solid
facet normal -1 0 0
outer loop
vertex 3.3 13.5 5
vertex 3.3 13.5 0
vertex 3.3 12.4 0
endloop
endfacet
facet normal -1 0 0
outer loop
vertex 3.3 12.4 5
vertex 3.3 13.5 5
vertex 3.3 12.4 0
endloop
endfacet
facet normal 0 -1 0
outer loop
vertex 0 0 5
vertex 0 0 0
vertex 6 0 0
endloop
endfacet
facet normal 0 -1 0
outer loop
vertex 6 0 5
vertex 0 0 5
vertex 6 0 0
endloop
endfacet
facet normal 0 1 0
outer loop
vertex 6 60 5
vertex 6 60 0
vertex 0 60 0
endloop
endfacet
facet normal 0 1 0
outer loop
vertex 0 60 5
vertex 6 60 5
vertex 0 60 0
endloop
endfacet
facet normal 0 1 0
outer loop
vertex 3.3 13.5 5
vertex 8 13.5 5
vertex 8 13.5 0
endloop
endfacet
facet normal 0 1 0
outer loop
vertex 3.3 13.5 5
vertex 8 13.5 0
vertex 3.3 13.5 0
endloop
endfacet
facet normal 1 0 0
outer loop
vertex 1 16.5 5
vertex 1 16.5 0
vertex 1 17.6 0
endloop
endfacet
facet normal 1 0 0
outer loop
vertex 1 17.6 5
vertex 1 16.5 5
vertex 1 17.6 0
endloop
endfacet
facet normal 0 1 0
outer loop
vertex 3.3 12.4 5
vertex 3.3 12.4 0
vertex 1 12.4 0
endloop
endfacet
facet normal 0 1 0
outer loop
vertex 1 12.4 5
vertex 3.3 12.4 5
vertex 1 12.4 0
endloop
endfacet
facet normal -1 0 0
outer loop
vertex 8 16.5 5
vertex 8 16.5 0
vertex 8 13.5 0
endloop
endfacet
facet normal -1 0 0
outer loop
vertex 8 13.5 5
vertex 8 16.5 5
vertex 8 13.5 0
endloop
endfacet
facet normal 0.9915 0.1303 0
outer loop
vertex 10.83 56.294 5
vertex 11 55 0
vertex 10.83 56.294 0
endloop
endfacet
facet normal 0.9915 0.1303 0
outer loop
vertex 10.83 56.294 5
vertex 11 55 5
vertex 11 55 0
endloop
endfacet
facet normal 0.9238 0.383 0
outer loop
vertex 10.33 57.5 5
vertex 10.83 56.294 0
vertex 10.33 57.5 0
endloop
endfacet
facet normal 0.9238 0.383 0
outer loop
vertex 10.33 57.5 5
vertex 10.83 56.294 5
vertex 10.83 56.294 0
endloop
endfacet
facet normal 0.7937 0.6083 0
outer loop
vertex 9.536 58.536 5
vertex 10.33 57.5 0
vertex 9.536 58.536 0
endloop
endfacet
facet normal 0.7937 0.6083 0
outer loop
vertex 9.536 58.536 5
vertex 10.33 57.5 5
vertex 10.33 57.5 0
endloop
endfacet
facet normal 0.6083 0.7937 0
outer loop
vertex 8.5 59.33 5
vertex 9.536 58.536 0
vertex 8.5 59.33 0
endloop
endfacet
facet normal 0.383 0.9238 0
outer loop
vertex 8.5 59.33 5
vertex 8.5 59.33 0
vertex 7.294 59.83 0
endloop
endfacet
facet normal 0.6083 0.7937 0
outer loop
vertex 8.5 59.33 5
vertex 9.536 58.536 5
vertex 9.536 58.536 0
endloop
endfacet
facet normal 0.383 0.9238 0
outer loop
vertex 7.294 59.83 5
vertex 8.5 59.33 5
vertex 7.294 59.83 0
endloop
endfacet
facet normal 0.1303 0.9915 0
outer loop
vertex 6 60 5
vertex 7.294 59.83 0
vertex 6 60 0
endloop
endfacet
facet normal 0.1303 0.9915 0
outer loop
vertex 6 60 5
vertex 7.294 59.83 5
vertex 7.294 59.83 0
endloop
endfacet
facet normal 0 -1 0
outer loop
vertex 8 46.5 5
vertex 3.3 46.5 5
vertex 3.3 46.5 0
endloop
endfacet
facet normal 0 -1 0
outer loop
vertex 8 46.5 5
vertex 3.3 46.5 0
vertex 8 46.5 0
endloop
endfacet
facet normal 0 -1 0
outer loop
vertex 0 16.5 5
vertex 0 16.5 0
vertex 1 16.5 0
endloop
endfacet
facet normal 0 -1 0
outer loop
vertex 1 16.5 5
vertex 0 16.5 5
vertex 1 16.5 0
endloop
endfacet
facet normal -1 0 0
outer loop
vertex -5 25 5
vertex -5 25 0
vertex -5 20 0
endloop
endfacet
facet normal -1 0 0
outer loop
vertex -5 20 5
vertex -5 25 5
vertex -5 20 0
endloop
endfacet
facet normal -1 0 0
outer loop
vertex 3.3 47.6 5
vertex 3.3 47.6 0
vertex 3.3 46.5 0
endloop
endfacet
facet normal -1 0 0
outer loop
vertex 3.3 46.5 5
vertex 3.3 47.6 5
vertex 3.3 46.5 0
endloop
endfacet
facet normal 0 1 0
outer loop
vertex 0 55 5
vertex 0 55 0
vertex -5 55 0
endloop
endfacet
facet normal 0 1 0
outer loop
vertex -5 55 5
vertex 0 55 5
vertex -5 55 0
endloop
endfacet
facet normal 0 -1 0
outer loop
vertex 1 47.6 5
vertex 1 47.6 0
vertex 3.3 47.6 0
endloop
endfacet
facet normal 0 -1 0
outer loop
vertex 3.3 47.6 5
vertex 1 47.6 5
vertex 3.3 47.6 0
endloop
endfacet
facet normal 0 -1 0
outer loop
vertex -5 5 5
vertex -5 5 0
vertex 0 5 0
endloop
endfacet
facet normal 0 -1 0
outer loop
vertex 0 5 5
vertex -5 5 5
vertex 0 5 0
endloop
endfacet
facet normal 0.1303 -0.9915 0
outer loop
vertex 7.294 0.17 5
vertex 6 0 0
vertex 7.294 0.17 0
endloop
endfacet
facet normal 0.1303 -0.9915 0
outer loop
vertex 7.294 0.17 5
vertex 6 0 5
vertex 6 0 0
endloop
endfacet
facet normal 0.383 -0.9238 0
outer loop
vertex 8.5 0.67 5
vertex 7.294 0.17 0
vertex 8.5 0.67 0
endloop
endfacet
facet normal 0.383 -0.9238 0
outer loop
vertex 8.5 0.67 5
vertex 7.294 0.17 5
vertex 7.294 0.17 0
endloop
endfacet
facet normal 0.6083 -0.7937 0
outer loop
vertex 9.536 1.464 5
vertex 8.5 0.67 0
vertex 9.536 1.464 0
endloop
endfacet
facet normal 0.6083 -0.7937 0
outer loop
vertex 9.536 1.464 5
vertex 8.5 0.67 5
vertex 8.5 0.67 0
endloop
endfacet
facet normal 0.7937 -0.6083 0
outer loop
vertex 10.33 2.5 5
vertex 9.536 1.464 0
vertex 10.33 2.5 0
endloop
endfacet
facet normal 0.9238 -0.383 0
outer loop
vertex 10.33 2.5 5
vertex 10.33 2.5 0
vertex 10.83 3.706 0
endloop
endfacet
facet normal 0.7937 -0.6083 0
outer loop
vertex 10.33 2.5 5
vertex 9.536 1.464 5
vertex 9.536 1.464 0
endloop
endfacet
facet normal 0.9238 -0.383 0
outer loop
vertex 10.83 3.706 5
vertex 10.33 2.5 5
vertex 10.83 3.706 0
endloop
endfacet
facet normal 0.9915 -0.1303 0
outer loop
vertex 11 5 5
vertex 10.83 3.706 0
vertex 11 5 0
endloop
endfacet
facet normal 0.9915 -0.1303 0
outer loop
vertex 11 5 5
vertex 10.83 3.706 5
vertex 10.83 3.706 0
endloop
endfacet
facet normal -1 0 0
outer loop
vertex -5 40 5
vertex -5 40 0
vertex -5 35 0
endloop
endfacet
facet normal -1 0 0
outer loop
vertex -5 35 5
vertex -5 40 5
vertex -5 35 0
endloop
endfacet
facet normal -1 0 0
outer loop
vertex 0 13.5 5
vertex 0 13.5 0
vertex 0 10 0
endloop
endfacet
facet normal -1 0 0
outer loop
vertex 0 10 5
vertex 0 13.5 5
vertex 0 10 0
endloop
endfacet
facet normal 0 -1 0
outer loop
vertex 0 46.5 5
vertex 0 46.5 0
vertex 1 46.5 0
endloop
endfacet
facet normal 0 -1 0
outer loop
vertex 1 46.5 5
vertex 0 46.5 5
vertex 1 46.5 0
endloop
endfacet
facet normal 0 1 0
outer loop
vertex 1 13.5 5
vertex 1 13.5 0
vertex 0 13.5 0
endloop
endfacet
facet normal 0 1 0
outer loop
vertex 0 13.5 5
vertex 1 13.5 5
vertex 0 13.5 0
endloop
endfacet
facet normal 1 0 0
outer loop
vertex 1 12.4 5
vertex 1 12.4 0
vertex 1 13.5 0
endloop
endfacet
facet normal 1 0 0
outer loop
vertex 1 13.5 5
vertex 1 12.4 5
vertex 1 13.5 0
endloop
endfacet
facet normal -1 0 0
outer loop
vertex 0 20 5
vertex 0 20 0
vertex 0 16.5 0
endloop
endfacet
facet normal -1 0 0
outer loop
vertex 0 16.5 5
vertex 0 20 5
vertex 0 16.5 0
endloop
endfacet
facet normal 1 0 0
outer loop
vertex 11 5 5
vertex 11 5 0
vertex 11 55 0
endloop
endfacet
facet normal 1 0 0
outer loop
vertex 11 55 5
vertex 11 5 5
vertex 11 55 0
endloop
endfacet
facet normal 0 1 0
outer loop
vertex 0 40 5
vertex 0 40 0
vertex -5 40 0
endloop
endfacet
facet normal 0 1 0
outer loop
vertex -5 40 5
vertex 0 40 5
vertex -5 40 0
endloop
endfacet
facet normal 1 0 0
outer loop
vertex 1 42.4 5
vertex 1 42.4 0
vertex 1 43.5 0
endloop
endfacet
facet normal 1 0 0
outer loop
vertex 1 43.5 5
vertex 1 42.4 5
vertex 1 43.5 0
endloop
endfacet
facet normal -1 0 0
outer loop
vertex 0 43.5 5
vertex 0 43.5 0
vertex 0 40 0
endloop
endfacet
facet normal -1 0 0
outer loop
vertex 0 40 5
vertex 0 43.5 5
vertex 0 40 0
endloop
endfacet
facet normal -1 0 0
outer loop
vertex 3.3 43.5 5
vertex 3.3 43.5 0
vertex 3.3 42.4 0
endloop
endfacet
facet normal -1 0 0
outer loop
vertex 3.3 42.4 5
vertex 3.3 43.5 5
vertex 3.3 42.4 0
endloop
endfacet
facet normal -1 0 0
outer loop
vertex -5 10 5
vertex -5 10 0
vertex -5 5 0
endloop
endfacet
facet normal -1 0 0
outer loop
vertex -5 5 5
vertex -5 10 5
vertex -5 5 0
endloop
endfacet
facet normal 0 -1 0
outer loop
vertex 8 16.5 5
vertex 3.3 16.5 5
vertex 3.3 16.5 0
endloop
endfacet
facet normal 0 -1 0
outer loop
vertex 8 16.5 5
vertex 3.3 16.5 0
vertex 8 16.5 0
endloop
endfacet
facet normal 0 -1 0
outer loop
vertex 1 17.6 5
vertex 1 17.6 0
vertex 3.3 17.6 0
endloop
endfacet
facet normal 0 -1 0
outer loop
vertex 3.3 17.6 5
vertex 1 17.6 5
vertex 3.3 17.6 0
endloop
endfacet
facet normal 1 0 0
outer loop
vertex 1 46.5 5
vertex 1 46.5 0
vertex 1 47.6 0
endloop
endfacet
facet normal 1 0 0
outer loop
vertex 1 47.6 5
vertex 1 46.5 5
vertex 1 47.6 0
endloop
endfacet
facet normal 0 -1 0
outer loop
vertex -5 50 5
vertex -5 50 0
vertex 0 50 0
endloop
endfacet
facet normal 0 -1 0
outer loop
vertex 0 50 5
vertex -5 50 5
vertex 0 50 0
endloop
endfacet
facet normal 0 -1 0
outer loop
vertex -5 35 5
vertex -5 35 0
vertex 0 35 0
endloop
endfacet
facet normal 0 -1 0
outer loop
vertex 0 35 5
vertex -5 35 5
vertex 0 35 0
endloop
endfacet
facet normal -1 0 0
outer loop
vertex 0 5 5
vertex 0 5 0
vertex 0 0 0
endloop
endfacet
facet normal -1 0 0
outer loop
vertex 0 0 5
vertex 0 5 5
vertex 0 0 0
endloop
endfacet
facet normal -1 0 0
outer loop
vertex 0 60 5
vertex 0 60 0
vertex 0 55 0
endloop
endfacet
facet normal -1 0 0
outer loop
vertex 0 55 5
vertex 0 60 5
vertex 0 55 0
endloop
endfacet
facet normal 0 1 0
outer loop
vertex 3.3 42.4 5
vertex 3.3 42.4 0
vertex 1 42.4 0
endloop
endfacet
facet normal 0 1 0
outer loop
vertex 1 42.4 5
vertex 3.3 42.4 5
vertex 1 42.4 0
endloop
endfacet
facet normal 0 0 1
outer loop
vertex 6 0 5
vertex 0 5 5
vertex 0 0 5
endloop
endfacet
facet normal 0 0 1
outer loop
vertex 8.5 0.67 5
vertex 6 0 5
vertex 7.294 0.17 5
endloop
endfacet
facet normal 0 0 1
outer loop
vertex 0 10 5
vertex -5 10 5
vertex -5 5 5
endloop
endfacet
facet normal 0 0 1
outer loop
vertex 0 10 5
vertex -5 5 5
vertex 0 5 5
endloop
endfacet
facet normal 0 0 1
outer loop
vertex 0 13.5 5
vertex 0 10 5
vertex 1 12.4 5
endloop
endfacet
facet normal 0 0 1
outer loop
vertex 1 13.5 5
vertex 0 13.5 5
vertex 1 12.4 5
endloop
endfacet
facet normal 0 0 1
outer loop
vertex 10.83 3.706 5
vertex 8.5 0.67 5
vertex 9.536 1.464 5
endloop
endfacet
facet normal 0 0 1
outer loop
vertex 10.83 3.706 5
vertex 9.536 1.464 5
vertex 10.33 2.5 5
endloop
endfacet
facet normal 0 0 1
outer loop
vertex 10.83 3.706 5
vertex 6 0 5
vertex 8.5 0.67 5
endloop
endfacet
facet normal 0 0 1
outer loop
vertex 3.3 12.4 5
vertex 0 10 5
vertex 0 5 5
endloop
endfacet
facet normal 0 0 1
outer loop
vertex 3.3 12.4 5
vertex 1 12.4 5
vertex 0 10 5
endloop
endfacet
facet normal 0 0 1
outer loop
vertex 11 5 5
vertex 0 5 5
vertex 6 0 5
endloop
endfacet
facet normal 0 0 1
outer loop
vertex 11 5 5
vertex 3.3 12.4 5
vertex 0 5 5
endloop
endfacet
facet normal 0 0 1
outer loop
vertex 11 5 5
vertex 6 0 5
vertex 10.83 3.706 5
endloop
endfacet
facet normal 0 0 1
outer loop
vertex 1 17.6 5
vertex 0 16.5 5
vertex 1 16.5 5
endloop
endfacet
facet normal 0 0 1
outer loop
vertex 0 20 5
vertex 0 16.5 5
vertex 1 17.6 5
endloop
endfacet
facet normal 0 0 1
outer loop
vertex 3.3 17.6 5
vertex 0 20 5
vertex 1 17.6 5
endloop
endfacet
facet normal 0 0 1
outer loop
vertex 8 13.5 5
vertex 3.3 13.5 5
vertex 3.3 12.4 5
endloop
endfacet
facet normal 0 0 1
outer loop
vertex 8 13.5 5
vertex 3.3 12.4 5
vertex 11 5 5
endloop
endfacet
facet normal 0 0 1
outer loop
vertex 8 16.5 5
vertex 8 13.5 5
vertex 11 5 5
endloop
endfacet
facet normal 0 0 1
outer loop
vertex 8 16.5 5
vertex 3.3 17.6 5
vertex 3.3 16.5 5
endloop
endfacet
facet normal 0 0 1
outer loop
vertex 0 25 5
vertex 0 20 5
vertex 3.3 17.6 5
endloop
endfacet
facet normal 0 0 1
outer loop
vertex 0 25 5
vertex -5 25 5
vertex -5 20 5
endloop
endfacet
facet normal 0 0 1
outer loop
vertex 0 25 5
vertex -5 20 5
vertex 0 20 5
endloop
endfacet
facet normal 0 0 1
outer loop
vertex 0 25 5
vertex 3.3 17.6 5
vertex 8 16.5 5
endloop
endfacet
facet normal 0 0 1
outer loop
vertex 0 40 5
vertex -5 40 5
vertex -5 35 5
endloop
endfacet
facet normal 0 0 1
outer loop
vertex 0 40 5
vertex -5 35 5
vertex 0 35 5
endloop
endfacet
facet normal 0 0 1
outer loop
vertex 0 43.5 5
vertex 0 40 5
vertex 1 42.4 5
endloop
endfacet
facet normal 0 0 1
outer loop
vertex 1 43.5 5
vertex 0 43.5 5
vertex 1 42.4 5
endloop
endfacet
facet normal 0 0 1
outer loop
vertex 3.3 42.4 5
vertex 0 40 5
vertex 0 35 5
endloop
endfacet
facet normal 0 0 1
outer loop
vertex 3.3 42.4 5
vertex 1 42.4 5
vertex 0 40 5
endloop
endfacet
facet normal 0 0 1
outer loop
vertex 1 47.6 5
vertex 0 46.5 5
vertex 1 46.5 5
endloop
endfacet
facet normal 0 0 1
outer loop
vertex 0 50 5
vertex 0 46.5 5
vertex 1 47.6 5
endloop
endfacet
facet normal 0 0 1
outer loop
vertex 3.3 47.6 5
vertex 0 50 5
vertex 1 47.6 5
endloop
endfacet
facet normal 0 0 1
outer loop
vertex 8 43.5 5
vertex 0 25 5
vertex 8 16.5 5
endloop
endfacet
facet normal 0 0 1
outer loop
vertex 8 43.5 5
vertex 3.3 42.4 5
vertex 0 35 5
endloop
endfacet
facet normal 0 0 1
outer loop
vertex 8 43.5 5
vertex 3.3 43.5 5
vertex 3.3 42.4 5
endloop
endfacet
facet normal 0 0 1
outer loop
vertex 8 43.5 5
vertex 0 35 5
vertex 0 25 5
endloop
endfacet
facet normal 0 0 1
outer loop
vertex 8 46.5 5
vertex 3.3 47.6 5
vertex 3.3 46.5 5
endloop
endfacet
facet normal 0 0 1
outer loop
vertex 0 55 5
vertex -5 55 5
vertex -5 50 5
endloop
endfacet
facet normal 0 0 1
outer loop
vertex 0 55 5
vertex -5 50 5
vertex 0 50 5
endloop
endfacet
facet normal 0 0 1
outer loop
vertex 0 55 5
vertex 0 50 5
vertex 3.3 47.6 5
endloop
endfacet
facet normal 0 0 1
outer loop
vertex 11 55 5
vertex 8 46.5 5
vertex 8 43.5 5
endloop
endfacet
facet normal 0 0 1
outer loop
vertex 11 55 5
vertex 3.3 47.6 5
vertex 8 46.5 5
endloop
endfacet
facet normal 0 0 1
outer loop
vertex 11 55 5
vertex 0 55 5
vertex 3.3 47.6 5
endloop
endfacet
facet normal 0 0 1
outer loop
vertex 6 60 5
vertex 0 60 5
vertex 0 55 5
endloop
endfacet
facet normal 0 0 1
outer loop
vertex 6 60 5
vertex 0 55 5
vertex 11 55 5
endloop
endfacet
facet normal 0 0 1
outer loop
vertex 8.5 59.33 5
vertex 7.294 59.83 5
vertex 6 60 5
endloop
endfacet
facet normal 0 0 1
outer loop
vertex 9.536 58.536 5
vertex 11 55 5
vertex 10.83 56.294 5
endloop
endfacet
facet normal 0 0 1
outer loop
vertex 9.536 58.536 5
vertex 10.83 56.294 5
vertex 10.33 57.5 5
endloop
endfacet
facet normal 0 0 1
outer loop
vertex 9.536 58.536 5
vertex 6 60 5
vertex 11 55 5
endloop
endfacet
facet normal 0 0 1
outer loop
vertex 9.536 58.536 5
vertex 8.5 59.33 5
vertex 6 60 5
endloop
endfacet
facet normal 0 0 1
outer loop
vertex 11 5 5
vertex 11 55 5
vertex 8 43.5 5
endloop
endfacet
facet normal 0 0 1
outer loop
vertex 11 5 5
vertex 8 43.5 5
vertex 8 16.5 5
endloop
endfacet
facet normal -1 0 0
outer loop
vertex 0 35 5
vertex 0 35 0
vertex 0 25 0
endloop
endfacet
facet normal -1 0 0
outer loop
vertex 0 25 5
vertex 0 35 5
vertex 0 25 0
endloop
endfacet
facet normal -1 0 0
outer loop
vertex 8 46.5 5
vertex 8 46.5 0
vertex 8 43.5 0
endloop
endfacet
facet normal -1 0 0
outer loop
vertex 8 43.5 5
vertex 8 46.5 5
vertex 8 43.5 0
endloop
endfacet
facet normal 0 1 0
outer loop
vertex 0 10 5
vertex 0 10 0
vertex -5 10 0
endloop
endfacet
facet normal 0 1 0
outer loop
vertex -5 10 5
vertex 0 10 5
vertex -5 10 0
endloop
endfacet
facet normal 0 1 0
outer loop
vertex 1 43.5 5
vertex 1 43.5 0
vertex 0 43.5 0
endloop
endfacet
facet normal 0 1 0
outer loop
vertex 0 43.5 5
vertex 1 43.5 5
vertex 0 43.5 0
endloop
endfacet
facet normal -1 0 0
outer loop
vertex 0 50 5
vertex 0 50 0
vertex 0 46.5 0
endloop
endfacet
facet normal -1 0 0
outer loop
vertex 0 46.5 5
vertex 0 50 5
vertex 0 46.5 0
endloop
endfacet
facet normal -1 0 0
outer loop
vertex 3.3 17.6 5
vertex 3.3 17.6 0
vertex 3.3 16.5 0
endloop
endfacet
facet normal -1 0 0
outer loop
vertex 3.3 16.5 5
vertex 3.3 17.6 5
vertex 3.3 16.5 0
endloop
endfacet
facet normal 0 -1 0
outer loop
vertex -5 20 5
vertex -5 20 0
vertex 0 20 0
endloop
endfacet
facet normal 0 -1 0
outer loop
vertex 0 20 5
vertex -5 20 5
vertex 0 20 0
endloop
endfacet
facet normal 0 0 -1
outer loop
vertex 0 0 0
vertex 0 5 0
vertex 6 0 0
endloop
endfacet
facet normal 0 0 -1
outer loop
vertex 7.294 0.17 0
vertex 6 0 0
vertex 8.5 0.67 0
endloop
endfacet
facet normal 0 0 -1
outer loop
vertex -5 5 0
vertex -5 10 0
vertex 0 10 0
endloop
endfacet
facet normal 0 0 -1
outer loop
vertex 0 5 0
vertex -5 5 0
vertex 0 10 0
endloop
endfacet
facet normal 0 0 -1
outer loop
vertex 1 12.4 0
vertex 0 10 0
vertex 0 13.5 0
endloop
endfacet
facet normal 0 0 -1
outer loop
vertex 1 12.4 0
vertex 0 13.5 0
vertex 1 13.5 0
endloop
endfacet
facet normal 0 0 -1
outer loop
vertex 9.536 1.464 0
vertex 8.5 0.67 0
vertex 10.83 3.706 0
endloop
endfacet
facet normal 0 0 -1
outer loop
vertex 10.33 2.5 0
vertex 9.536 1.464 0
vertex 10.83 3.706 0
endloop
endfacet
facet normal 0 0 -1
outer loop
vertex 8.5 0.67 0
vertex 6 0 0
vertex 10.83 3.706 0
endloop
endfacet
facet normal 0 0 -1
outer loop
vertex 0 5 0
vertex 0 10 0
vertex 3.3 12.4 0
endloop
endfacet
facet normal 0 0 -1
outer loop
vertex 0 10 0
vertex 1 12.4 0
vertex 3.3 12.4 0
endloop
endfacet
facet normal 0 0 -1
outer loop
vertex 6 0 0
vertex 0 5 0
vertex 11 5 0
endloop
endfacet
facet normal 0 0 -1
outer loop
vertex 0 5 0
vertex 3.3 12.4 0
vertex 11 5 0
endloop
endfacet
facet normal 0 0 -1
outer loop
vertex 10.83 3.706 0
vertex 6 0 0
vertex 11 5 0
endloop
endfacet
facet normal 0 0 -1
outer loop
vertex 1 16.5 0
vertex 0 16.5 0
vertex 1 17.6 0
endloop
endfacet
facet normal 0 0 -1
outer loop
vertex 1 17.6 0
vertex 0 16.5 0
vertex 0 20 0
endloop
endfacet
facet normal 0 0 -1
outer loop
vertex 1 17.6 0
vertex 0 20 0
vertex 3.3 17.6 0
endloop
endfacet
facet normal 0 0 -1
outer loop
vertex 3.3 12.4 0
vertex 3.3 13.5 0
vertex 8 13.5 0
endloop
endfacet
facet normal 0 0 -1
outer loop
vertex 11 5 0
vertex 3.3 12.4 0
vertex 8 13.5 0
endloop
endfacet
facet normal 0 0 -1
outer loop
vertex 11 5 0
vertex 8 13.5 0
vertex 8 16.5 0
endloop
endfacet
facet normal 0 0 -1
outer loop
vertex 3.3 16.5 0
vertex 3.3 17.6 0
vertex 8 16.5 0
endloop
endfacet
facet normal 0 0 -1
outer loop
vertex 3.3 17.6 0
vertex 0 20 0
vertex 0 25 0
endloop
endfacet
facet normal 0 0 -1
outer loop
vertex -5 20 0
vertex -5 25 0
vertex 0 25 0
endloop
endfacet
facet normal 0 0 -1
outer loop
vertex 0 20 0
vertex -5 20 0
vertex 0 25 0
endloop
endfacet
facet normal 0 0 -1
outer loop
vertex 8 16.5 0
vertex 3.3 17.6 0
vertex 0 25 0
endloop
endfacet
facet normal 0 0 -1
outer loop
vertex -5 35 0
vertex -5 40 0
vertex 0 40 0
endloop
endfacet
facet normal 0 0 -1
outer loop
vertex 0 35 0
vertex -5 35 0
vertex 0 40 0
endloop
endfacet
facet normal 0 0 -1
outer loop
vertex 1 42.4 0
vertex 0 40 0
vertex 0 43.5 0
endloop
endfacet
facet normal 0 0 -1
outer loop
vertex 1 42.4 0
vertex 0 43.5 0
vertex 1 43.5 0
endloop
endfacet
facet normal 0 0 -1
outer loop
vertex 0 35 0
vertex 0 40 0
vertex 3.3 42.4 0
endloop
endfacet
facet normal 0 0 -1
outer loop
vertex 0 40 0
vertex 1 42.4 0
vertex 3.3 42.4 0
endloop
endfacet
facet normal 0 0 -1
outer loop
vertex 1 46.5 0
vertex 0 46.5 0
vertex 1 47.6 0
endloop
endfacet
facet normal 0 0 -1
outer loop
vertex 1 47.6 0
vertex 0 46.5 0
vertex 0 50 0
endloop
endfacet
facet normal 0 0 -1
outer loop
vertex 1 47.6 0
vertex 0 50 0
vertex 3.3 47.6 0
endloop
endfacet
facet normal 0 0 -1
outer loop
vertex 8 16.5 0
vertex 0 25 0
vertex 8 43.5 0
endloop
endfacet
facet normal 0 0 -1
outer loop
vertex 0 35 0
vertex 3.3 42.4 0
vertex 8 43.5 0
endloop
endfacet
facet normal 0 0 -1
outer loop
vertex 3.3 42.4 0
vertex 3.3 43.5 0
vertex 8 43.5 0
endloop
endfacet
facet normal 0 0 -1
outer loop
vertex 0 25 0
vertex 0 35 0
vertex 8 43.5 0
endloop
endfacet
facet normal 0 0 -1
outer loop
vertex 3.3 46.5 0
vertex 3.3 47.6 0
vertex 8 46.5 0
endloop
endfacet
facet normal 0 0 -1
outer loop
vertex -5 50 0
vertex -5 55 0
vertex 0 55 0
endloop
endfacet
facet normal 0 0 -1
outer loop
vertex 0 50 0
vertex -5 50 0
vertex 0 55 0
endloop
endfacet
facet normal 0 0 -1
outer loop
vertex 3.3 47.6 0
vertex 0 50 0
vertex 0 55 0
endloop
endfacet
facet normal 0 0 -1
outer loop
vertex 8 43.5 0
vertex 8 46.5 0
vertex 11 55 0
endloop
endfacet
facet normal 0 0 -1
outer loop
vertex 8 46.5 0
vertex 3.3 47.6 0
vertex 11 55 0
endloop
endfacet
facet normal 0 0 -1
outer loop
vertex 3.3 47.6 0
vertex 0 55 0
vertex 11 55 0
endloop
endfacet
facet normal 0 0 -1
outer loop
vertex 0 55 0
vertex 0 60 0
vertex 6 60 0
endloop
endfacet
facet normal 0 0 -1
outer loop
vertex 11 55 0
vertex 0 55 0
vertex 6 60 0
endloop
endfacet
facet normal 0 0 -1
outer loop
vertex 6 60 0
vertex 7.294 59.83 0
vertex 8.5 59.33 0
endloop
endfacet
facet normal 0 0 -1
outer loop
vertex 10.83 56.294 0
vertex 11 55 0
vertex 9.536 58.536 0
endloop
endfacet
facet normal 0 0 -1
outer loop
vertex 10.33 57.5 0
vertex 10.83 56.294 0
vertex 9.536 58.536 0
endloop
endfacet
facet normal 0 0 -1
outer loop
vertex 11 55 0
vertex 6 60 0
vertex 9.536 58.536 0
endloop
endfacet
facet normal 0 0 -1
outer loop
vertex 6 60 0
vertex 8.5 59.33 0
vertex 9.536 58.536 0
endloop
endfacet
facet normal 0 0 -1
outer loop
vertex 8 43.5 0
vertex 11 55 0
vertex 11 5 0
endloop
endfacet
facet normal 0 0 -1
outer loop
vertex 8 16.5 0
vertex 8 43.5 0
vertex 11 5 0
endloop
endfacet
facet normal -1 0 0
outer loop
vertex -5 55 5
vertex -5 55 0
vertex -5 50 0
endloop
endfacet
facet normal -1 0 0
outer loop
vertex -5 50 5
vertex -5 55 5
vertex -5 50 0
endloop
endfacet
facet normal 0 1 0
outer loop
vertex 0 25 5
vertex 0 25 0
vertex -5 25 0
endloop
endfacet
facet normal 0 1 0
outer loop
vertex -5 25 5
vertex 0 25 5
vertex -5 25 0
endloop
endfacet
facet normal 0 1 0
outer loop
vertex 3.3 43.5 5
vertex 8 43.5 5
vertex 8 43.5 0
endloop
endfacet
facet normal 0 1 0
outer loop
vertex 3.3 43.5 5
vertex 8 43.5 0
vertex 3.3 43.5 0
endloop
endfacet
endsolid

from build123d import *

# Parameters (mm, degrees)
BOSS_EXTRUDE1_DEPTH = 5
FILLET1_R           = 5


with BuildPart() as part:
    # Sketch1 → Boss-Extrude1 (new body)
    with BuildSketch(Plane.XY):
        Polygon((0, 60), (0, 55), (-5, 55), (-5, 50), (0, 50), (0, 46.5), (1, 46.5), (1, 47.6), (3.3, 47.6), (3.3, 46.5), (8, 46.5), (8, 43.5), (3.3, 43.5), (3.3, 42.4), (1, 42.4), (1, 43.5), (0, 43.5), (0, 40), (-5, 40), (-5, 35), (0, 35), (0, 25), (-5, 25), (-5, 20), (0, 20), (0, 16.5), (1, 16.5), (1, 17.6), (3.3, 17.6), (3.3, 16.5), (8, 16.5), (8, 13.5), (3.3, 13.5), (3.3, 12.4), (1, 12.4), (1, 13.5), (0, 13.5), (0, 10), (-5, 10), (-5, 5), (0, 5), (0, 0), (11, 0), (11, 60), align=None)
    extrude(amount=BOSS_EXTRUDE1_DEPTH)

    # Fillet1
    fillet1_edges = [part.edges().sort_by_distance(p)[0] for p in [
        (11, 60, 2.5),
        (11, 0, 2.5),
    ]]
    fillet(fillet1_edges, radius=FILLET1_R)


solid = part.part
